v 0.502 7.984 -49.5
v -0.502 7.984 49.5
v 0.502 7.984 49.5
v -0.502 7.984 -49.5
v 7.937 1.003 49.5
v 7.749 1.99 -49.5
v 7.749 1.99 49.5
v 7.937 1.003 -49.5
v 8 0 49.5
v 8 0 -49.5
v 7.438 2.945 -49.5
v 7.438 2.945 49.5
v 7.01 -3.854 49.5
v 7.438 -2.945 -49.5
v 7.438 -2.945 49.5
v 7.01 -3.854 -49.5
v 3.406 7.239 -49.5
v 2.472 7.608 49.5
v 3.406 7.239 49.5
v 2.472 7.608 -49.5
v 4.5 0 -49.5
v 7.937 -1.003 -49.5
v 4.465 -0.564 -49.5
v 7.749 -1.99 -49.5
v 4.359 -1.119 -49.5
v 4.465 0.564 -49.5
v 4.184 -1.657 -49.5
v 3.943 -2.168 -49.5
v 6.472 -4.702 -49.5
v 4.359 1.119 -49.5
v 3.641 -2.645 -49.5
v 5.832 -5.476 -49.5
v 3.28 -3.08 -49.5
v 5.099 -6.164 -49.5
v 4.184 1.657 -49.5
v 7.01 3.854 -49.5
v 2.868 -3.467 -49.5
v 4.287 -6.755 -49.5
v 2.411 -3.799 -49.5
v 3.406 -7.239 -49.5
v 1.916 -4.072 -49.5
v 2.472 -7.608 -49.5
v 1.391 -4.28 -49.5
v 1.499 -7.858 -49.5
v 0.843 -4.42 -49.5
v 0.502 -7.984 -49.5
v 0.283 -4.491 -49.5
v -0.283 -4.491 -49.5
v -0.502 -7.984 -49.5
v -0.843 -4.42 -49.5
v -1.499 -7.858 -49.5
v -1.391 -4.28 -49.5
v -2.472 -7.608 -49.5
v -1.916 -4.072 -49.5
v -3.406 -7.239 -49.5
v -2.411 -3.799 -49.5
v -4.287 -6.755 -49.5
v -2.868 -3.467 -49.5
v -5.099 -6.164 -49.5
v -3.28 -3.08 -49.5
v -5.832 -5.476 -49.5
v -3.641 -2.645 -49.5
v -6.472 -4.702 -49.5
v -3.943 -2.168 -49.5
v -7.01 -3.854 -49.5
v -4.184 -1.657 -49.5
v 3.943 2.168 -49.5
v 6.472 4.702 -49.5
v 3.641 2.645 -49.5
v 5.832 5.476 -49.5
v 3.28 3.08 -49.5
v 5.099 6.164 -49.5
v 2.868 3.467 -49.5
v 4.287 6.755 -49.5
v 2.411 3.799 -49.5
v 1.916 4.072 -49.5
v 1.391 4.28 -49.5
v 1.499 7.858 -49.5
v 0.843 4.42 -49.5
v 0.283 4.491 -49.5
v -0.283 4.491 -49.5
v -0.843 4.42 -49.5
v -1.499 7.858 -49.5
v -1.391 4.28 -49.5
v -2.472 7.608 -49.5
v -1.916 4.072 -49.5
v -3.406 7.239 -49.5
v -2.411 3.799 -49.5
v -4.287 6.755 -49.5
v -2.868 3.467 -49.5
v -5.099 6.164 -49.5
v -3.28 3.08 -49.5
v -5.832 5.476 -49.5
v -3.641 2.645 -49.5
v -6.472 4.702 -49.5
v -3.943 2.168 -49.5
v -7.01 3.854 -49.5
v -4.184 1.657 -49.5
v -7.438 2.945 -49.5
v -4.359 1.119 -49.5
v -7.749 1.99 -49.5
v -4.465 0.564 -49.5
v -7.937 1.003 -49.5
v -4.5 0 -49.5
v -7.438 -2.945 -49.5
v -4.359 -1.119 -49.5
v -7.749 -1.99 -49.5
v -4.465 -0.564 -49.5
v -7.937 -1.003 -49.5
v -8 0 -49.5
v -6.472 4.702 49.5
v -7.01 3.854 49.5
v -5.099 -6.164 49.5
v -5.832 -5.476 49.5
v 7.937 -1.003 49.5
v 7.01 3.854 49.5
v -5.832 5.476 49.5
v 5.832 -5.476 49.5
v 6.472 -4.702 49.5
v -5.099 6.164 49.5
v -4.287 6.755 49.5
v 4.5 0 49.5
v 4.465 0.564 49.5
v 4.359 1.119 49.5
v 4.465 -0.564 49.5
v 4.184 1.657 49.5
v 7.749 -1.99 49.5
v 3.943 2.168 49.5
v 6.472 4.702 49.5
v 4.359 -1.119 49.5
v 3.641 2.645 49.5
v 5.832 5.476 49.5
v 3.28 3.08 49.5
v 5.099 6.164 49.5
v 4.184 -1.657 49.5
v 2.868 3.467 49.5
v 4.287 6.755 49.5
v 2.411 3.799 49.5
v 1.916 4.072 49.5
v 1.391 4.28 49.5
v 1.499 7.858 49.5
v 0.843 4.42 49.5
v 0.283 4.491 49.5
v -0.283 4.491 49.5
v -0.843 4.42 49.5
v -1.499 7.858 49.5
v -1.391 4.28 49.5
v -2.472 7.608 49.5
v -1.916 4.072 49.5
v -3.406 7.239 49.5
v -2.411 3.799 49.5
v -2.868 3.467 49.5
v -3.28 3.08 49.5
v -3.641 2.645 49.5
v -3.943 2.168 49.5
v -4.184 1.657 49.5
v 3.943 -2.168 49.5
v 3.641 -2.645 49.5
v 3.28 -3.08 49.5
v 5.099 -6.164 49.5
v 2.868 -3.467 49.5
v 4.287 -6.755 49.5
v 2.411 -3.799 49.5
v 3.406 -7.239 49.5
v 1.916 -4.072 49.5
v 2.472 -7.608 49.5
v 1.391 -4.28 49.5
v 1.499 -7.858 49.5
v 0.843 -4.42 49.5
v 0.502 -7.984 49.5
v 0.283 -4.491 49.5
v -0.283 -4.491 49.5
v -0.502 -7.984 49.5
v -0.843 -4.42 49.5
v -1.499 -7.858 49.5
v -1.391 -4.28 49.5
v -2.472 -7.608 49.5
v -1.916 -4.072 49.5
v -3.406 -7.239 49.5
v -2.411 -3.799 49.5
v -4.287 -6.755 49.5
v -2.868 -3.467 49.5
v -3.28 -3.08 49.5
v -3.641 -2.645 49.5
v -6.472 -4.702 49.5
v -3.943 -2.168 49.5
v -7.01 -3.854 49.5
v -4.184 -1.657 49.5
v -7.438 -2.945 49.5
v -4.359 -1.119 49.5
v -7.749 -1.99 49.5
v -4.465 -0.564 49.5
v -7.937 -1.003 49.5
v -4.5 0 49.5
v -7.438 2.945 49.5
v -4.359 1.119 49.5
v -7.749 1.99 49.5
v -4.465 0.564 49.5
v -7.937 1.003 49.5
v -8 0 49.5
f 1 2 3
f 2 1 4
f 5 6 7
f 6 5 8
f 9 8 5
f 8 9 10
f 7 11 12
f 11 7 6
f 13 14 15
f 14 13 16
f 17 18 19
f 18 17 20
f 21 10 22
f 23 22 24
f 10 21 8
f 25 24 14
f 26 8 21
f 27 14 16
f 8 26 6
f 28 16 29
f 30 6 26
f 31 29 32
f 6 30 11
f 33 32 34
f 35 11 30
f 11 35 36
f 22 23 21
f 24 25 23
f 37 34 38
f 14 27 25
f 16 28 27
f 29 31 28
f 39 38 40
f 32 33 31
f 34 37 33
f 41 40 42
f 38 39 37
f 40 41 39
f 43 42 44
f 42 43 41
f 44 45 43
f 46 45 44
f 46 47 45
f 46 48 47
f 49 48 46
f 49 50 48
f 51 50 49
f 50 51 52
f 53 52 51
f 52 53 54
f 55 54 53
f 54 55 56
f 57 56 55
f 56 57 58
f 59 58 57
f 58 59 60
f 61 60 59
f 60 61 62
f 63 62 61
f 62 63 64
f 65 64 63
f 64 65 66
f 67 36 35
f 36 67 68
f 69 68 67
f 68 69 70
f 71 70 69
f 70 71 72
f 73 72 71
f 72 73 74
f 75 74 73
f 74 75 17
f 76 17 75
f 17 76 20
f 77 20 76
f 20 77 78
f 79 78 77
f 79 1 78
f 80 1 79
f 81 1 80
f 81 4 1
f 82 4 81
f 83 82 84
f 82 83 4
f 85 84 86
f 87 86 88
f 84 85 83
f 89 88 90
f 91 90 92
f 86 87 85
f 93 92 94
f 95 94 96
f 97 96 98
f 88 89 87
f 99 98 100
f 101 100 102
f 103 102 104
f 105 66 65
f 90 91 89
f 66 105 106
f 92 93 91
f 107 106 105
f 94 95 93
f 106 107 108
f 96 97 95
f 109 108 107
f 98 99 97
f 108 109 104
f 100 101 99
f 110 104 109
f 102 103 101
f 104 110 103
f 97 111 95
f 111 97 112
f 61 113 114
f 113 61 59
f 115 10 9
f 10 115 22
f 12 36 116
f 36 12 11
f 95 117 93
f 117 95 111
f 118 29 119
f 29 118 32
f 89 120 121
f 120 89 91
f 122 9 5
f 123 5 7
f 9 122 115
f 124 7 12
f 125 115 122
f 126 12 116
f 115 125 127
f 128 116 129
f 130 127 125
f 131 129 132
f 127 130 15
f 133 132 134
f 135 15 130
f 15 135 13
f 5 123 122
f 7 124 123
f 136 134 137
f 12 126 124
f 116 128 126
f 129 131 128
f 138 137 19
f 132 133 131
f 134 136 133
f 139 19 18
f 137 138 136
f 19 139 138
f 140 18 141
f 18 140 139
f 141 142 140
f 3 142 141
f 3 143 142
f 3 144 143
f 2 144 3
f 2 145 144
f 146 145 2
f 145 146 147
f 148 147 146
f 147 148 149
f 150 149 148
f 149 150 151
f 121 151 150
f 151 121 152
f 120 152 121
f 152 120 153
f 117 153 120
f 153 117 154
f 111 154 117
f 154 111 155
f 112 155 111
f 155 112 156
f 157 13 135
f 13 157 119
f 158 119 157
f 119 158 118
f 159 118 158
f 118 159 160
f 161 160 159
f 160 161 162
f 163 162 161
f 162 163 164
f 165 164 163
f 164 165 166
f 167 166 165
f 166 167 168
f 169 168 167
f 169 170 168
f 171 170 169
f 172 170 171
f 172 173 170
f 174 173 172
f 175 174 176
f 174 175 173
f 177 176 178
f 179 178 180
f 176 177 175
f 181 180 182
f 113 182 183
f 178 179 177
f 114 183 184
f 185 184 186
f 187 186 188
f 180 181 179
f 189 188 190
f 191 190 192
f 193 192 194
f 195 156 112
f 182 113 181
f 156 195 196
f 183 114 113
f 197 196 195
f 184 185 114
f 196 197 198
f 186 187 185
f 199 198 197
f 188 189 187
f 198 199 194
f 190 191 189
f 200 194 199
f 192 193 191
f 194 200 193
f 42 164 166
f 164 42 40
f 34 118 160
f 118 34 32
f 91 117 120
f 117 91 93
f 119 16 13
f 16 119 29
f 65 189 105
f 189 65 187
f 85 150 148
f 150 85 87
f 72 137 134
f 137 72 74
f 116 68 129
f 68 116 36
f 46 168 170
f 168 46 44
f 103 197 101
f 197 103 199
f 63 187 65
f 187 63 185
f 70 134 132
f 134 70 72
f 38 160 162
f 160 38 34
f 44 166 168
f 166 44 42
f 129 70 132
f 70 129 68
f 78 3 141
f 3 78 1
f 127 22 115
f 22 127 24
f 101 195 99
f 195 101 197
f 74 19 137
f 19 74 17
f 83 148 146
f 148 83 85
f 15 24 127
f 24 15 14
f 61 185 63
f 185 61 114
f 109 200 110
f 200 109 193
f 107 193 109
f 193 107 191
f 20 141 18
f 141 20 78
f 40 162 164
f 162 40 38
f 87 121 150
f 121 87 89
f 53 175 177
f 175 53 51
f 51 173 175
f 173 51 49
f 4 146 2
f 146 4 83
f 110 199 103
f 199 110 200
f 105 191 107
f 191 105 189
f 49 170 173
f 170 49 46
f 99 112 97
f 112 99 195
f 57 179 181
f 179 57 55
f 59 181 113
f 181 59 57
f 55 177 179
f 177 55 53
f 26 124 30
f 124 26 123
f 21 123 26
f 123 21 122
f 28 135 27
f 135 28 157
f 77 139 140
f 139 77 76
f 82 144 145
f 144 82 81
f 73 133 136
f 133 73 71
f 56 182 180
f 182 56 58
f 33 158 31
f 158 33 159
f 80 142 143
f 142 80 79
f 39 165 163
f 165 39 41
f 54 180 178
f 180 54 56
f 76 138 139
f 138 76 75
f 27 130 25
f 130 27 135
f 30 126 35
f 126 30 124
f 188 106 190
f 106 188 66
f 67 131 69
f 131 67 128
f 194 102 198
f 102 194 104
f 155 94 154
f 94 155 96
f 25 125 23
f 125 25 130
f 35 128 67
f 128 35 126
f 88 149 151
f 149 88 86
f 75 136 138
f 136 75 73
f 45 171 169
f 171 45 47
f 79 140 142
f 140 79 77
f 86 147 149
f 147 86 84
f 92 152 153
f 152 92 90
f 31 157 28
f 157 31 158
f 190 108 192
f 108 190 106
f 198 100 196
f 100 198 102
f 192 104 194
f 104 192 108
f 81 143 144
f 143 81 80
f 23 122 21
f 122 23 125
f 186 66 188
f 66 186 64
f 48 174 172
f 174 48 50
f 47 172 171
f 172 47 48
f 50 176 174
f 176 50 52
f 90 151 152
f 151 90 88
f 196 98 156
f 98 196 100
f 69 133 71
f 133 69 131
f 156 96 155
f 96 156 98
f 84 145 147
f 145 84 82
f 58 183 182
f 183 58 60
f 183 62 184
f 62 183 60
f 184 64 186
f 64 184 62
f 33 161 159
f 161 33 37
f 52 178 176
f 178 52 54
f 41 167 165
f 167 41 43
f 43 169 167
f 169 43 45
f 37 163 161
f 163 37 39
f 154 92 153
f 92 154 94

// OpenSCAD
$fn = 50;


difference() {
	union() {
		translate(v = [0, 0, -49.5000000000]) {
			cylinder(h = 99, r = 8.0000000000);
		}
	}
	union() {
		translate(v = [0, 0, -100.0000000000]) {
			cylinder(h = 200, r = 4.5000000000);
		}
	}
}
